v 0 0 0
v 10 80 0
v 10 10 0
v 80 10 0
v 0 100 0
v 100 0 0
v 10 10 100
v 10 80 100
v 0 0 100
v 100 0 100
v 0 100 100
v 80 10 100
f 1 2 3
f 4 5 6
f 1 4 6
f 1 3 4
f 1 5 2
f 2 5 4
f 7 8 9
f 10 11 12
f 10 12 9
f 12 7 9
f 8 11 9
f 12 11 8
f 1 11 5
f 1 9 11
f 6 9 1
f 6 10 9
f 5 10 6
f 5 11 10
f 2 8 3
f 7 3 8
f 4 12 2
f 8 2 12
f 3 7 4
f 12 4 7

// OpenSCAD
triangle_points =[
  [0,0],[100,0],[0,100],
  [10,10],[80,10],[10,80]
];
triangle_paths =[
  [0,1,2],[3,4,5]
];
linear_extrude(h=1)
    polygon(
      points = triangle_points,
      paths = triangle_paths,
      convexity=10
  );
